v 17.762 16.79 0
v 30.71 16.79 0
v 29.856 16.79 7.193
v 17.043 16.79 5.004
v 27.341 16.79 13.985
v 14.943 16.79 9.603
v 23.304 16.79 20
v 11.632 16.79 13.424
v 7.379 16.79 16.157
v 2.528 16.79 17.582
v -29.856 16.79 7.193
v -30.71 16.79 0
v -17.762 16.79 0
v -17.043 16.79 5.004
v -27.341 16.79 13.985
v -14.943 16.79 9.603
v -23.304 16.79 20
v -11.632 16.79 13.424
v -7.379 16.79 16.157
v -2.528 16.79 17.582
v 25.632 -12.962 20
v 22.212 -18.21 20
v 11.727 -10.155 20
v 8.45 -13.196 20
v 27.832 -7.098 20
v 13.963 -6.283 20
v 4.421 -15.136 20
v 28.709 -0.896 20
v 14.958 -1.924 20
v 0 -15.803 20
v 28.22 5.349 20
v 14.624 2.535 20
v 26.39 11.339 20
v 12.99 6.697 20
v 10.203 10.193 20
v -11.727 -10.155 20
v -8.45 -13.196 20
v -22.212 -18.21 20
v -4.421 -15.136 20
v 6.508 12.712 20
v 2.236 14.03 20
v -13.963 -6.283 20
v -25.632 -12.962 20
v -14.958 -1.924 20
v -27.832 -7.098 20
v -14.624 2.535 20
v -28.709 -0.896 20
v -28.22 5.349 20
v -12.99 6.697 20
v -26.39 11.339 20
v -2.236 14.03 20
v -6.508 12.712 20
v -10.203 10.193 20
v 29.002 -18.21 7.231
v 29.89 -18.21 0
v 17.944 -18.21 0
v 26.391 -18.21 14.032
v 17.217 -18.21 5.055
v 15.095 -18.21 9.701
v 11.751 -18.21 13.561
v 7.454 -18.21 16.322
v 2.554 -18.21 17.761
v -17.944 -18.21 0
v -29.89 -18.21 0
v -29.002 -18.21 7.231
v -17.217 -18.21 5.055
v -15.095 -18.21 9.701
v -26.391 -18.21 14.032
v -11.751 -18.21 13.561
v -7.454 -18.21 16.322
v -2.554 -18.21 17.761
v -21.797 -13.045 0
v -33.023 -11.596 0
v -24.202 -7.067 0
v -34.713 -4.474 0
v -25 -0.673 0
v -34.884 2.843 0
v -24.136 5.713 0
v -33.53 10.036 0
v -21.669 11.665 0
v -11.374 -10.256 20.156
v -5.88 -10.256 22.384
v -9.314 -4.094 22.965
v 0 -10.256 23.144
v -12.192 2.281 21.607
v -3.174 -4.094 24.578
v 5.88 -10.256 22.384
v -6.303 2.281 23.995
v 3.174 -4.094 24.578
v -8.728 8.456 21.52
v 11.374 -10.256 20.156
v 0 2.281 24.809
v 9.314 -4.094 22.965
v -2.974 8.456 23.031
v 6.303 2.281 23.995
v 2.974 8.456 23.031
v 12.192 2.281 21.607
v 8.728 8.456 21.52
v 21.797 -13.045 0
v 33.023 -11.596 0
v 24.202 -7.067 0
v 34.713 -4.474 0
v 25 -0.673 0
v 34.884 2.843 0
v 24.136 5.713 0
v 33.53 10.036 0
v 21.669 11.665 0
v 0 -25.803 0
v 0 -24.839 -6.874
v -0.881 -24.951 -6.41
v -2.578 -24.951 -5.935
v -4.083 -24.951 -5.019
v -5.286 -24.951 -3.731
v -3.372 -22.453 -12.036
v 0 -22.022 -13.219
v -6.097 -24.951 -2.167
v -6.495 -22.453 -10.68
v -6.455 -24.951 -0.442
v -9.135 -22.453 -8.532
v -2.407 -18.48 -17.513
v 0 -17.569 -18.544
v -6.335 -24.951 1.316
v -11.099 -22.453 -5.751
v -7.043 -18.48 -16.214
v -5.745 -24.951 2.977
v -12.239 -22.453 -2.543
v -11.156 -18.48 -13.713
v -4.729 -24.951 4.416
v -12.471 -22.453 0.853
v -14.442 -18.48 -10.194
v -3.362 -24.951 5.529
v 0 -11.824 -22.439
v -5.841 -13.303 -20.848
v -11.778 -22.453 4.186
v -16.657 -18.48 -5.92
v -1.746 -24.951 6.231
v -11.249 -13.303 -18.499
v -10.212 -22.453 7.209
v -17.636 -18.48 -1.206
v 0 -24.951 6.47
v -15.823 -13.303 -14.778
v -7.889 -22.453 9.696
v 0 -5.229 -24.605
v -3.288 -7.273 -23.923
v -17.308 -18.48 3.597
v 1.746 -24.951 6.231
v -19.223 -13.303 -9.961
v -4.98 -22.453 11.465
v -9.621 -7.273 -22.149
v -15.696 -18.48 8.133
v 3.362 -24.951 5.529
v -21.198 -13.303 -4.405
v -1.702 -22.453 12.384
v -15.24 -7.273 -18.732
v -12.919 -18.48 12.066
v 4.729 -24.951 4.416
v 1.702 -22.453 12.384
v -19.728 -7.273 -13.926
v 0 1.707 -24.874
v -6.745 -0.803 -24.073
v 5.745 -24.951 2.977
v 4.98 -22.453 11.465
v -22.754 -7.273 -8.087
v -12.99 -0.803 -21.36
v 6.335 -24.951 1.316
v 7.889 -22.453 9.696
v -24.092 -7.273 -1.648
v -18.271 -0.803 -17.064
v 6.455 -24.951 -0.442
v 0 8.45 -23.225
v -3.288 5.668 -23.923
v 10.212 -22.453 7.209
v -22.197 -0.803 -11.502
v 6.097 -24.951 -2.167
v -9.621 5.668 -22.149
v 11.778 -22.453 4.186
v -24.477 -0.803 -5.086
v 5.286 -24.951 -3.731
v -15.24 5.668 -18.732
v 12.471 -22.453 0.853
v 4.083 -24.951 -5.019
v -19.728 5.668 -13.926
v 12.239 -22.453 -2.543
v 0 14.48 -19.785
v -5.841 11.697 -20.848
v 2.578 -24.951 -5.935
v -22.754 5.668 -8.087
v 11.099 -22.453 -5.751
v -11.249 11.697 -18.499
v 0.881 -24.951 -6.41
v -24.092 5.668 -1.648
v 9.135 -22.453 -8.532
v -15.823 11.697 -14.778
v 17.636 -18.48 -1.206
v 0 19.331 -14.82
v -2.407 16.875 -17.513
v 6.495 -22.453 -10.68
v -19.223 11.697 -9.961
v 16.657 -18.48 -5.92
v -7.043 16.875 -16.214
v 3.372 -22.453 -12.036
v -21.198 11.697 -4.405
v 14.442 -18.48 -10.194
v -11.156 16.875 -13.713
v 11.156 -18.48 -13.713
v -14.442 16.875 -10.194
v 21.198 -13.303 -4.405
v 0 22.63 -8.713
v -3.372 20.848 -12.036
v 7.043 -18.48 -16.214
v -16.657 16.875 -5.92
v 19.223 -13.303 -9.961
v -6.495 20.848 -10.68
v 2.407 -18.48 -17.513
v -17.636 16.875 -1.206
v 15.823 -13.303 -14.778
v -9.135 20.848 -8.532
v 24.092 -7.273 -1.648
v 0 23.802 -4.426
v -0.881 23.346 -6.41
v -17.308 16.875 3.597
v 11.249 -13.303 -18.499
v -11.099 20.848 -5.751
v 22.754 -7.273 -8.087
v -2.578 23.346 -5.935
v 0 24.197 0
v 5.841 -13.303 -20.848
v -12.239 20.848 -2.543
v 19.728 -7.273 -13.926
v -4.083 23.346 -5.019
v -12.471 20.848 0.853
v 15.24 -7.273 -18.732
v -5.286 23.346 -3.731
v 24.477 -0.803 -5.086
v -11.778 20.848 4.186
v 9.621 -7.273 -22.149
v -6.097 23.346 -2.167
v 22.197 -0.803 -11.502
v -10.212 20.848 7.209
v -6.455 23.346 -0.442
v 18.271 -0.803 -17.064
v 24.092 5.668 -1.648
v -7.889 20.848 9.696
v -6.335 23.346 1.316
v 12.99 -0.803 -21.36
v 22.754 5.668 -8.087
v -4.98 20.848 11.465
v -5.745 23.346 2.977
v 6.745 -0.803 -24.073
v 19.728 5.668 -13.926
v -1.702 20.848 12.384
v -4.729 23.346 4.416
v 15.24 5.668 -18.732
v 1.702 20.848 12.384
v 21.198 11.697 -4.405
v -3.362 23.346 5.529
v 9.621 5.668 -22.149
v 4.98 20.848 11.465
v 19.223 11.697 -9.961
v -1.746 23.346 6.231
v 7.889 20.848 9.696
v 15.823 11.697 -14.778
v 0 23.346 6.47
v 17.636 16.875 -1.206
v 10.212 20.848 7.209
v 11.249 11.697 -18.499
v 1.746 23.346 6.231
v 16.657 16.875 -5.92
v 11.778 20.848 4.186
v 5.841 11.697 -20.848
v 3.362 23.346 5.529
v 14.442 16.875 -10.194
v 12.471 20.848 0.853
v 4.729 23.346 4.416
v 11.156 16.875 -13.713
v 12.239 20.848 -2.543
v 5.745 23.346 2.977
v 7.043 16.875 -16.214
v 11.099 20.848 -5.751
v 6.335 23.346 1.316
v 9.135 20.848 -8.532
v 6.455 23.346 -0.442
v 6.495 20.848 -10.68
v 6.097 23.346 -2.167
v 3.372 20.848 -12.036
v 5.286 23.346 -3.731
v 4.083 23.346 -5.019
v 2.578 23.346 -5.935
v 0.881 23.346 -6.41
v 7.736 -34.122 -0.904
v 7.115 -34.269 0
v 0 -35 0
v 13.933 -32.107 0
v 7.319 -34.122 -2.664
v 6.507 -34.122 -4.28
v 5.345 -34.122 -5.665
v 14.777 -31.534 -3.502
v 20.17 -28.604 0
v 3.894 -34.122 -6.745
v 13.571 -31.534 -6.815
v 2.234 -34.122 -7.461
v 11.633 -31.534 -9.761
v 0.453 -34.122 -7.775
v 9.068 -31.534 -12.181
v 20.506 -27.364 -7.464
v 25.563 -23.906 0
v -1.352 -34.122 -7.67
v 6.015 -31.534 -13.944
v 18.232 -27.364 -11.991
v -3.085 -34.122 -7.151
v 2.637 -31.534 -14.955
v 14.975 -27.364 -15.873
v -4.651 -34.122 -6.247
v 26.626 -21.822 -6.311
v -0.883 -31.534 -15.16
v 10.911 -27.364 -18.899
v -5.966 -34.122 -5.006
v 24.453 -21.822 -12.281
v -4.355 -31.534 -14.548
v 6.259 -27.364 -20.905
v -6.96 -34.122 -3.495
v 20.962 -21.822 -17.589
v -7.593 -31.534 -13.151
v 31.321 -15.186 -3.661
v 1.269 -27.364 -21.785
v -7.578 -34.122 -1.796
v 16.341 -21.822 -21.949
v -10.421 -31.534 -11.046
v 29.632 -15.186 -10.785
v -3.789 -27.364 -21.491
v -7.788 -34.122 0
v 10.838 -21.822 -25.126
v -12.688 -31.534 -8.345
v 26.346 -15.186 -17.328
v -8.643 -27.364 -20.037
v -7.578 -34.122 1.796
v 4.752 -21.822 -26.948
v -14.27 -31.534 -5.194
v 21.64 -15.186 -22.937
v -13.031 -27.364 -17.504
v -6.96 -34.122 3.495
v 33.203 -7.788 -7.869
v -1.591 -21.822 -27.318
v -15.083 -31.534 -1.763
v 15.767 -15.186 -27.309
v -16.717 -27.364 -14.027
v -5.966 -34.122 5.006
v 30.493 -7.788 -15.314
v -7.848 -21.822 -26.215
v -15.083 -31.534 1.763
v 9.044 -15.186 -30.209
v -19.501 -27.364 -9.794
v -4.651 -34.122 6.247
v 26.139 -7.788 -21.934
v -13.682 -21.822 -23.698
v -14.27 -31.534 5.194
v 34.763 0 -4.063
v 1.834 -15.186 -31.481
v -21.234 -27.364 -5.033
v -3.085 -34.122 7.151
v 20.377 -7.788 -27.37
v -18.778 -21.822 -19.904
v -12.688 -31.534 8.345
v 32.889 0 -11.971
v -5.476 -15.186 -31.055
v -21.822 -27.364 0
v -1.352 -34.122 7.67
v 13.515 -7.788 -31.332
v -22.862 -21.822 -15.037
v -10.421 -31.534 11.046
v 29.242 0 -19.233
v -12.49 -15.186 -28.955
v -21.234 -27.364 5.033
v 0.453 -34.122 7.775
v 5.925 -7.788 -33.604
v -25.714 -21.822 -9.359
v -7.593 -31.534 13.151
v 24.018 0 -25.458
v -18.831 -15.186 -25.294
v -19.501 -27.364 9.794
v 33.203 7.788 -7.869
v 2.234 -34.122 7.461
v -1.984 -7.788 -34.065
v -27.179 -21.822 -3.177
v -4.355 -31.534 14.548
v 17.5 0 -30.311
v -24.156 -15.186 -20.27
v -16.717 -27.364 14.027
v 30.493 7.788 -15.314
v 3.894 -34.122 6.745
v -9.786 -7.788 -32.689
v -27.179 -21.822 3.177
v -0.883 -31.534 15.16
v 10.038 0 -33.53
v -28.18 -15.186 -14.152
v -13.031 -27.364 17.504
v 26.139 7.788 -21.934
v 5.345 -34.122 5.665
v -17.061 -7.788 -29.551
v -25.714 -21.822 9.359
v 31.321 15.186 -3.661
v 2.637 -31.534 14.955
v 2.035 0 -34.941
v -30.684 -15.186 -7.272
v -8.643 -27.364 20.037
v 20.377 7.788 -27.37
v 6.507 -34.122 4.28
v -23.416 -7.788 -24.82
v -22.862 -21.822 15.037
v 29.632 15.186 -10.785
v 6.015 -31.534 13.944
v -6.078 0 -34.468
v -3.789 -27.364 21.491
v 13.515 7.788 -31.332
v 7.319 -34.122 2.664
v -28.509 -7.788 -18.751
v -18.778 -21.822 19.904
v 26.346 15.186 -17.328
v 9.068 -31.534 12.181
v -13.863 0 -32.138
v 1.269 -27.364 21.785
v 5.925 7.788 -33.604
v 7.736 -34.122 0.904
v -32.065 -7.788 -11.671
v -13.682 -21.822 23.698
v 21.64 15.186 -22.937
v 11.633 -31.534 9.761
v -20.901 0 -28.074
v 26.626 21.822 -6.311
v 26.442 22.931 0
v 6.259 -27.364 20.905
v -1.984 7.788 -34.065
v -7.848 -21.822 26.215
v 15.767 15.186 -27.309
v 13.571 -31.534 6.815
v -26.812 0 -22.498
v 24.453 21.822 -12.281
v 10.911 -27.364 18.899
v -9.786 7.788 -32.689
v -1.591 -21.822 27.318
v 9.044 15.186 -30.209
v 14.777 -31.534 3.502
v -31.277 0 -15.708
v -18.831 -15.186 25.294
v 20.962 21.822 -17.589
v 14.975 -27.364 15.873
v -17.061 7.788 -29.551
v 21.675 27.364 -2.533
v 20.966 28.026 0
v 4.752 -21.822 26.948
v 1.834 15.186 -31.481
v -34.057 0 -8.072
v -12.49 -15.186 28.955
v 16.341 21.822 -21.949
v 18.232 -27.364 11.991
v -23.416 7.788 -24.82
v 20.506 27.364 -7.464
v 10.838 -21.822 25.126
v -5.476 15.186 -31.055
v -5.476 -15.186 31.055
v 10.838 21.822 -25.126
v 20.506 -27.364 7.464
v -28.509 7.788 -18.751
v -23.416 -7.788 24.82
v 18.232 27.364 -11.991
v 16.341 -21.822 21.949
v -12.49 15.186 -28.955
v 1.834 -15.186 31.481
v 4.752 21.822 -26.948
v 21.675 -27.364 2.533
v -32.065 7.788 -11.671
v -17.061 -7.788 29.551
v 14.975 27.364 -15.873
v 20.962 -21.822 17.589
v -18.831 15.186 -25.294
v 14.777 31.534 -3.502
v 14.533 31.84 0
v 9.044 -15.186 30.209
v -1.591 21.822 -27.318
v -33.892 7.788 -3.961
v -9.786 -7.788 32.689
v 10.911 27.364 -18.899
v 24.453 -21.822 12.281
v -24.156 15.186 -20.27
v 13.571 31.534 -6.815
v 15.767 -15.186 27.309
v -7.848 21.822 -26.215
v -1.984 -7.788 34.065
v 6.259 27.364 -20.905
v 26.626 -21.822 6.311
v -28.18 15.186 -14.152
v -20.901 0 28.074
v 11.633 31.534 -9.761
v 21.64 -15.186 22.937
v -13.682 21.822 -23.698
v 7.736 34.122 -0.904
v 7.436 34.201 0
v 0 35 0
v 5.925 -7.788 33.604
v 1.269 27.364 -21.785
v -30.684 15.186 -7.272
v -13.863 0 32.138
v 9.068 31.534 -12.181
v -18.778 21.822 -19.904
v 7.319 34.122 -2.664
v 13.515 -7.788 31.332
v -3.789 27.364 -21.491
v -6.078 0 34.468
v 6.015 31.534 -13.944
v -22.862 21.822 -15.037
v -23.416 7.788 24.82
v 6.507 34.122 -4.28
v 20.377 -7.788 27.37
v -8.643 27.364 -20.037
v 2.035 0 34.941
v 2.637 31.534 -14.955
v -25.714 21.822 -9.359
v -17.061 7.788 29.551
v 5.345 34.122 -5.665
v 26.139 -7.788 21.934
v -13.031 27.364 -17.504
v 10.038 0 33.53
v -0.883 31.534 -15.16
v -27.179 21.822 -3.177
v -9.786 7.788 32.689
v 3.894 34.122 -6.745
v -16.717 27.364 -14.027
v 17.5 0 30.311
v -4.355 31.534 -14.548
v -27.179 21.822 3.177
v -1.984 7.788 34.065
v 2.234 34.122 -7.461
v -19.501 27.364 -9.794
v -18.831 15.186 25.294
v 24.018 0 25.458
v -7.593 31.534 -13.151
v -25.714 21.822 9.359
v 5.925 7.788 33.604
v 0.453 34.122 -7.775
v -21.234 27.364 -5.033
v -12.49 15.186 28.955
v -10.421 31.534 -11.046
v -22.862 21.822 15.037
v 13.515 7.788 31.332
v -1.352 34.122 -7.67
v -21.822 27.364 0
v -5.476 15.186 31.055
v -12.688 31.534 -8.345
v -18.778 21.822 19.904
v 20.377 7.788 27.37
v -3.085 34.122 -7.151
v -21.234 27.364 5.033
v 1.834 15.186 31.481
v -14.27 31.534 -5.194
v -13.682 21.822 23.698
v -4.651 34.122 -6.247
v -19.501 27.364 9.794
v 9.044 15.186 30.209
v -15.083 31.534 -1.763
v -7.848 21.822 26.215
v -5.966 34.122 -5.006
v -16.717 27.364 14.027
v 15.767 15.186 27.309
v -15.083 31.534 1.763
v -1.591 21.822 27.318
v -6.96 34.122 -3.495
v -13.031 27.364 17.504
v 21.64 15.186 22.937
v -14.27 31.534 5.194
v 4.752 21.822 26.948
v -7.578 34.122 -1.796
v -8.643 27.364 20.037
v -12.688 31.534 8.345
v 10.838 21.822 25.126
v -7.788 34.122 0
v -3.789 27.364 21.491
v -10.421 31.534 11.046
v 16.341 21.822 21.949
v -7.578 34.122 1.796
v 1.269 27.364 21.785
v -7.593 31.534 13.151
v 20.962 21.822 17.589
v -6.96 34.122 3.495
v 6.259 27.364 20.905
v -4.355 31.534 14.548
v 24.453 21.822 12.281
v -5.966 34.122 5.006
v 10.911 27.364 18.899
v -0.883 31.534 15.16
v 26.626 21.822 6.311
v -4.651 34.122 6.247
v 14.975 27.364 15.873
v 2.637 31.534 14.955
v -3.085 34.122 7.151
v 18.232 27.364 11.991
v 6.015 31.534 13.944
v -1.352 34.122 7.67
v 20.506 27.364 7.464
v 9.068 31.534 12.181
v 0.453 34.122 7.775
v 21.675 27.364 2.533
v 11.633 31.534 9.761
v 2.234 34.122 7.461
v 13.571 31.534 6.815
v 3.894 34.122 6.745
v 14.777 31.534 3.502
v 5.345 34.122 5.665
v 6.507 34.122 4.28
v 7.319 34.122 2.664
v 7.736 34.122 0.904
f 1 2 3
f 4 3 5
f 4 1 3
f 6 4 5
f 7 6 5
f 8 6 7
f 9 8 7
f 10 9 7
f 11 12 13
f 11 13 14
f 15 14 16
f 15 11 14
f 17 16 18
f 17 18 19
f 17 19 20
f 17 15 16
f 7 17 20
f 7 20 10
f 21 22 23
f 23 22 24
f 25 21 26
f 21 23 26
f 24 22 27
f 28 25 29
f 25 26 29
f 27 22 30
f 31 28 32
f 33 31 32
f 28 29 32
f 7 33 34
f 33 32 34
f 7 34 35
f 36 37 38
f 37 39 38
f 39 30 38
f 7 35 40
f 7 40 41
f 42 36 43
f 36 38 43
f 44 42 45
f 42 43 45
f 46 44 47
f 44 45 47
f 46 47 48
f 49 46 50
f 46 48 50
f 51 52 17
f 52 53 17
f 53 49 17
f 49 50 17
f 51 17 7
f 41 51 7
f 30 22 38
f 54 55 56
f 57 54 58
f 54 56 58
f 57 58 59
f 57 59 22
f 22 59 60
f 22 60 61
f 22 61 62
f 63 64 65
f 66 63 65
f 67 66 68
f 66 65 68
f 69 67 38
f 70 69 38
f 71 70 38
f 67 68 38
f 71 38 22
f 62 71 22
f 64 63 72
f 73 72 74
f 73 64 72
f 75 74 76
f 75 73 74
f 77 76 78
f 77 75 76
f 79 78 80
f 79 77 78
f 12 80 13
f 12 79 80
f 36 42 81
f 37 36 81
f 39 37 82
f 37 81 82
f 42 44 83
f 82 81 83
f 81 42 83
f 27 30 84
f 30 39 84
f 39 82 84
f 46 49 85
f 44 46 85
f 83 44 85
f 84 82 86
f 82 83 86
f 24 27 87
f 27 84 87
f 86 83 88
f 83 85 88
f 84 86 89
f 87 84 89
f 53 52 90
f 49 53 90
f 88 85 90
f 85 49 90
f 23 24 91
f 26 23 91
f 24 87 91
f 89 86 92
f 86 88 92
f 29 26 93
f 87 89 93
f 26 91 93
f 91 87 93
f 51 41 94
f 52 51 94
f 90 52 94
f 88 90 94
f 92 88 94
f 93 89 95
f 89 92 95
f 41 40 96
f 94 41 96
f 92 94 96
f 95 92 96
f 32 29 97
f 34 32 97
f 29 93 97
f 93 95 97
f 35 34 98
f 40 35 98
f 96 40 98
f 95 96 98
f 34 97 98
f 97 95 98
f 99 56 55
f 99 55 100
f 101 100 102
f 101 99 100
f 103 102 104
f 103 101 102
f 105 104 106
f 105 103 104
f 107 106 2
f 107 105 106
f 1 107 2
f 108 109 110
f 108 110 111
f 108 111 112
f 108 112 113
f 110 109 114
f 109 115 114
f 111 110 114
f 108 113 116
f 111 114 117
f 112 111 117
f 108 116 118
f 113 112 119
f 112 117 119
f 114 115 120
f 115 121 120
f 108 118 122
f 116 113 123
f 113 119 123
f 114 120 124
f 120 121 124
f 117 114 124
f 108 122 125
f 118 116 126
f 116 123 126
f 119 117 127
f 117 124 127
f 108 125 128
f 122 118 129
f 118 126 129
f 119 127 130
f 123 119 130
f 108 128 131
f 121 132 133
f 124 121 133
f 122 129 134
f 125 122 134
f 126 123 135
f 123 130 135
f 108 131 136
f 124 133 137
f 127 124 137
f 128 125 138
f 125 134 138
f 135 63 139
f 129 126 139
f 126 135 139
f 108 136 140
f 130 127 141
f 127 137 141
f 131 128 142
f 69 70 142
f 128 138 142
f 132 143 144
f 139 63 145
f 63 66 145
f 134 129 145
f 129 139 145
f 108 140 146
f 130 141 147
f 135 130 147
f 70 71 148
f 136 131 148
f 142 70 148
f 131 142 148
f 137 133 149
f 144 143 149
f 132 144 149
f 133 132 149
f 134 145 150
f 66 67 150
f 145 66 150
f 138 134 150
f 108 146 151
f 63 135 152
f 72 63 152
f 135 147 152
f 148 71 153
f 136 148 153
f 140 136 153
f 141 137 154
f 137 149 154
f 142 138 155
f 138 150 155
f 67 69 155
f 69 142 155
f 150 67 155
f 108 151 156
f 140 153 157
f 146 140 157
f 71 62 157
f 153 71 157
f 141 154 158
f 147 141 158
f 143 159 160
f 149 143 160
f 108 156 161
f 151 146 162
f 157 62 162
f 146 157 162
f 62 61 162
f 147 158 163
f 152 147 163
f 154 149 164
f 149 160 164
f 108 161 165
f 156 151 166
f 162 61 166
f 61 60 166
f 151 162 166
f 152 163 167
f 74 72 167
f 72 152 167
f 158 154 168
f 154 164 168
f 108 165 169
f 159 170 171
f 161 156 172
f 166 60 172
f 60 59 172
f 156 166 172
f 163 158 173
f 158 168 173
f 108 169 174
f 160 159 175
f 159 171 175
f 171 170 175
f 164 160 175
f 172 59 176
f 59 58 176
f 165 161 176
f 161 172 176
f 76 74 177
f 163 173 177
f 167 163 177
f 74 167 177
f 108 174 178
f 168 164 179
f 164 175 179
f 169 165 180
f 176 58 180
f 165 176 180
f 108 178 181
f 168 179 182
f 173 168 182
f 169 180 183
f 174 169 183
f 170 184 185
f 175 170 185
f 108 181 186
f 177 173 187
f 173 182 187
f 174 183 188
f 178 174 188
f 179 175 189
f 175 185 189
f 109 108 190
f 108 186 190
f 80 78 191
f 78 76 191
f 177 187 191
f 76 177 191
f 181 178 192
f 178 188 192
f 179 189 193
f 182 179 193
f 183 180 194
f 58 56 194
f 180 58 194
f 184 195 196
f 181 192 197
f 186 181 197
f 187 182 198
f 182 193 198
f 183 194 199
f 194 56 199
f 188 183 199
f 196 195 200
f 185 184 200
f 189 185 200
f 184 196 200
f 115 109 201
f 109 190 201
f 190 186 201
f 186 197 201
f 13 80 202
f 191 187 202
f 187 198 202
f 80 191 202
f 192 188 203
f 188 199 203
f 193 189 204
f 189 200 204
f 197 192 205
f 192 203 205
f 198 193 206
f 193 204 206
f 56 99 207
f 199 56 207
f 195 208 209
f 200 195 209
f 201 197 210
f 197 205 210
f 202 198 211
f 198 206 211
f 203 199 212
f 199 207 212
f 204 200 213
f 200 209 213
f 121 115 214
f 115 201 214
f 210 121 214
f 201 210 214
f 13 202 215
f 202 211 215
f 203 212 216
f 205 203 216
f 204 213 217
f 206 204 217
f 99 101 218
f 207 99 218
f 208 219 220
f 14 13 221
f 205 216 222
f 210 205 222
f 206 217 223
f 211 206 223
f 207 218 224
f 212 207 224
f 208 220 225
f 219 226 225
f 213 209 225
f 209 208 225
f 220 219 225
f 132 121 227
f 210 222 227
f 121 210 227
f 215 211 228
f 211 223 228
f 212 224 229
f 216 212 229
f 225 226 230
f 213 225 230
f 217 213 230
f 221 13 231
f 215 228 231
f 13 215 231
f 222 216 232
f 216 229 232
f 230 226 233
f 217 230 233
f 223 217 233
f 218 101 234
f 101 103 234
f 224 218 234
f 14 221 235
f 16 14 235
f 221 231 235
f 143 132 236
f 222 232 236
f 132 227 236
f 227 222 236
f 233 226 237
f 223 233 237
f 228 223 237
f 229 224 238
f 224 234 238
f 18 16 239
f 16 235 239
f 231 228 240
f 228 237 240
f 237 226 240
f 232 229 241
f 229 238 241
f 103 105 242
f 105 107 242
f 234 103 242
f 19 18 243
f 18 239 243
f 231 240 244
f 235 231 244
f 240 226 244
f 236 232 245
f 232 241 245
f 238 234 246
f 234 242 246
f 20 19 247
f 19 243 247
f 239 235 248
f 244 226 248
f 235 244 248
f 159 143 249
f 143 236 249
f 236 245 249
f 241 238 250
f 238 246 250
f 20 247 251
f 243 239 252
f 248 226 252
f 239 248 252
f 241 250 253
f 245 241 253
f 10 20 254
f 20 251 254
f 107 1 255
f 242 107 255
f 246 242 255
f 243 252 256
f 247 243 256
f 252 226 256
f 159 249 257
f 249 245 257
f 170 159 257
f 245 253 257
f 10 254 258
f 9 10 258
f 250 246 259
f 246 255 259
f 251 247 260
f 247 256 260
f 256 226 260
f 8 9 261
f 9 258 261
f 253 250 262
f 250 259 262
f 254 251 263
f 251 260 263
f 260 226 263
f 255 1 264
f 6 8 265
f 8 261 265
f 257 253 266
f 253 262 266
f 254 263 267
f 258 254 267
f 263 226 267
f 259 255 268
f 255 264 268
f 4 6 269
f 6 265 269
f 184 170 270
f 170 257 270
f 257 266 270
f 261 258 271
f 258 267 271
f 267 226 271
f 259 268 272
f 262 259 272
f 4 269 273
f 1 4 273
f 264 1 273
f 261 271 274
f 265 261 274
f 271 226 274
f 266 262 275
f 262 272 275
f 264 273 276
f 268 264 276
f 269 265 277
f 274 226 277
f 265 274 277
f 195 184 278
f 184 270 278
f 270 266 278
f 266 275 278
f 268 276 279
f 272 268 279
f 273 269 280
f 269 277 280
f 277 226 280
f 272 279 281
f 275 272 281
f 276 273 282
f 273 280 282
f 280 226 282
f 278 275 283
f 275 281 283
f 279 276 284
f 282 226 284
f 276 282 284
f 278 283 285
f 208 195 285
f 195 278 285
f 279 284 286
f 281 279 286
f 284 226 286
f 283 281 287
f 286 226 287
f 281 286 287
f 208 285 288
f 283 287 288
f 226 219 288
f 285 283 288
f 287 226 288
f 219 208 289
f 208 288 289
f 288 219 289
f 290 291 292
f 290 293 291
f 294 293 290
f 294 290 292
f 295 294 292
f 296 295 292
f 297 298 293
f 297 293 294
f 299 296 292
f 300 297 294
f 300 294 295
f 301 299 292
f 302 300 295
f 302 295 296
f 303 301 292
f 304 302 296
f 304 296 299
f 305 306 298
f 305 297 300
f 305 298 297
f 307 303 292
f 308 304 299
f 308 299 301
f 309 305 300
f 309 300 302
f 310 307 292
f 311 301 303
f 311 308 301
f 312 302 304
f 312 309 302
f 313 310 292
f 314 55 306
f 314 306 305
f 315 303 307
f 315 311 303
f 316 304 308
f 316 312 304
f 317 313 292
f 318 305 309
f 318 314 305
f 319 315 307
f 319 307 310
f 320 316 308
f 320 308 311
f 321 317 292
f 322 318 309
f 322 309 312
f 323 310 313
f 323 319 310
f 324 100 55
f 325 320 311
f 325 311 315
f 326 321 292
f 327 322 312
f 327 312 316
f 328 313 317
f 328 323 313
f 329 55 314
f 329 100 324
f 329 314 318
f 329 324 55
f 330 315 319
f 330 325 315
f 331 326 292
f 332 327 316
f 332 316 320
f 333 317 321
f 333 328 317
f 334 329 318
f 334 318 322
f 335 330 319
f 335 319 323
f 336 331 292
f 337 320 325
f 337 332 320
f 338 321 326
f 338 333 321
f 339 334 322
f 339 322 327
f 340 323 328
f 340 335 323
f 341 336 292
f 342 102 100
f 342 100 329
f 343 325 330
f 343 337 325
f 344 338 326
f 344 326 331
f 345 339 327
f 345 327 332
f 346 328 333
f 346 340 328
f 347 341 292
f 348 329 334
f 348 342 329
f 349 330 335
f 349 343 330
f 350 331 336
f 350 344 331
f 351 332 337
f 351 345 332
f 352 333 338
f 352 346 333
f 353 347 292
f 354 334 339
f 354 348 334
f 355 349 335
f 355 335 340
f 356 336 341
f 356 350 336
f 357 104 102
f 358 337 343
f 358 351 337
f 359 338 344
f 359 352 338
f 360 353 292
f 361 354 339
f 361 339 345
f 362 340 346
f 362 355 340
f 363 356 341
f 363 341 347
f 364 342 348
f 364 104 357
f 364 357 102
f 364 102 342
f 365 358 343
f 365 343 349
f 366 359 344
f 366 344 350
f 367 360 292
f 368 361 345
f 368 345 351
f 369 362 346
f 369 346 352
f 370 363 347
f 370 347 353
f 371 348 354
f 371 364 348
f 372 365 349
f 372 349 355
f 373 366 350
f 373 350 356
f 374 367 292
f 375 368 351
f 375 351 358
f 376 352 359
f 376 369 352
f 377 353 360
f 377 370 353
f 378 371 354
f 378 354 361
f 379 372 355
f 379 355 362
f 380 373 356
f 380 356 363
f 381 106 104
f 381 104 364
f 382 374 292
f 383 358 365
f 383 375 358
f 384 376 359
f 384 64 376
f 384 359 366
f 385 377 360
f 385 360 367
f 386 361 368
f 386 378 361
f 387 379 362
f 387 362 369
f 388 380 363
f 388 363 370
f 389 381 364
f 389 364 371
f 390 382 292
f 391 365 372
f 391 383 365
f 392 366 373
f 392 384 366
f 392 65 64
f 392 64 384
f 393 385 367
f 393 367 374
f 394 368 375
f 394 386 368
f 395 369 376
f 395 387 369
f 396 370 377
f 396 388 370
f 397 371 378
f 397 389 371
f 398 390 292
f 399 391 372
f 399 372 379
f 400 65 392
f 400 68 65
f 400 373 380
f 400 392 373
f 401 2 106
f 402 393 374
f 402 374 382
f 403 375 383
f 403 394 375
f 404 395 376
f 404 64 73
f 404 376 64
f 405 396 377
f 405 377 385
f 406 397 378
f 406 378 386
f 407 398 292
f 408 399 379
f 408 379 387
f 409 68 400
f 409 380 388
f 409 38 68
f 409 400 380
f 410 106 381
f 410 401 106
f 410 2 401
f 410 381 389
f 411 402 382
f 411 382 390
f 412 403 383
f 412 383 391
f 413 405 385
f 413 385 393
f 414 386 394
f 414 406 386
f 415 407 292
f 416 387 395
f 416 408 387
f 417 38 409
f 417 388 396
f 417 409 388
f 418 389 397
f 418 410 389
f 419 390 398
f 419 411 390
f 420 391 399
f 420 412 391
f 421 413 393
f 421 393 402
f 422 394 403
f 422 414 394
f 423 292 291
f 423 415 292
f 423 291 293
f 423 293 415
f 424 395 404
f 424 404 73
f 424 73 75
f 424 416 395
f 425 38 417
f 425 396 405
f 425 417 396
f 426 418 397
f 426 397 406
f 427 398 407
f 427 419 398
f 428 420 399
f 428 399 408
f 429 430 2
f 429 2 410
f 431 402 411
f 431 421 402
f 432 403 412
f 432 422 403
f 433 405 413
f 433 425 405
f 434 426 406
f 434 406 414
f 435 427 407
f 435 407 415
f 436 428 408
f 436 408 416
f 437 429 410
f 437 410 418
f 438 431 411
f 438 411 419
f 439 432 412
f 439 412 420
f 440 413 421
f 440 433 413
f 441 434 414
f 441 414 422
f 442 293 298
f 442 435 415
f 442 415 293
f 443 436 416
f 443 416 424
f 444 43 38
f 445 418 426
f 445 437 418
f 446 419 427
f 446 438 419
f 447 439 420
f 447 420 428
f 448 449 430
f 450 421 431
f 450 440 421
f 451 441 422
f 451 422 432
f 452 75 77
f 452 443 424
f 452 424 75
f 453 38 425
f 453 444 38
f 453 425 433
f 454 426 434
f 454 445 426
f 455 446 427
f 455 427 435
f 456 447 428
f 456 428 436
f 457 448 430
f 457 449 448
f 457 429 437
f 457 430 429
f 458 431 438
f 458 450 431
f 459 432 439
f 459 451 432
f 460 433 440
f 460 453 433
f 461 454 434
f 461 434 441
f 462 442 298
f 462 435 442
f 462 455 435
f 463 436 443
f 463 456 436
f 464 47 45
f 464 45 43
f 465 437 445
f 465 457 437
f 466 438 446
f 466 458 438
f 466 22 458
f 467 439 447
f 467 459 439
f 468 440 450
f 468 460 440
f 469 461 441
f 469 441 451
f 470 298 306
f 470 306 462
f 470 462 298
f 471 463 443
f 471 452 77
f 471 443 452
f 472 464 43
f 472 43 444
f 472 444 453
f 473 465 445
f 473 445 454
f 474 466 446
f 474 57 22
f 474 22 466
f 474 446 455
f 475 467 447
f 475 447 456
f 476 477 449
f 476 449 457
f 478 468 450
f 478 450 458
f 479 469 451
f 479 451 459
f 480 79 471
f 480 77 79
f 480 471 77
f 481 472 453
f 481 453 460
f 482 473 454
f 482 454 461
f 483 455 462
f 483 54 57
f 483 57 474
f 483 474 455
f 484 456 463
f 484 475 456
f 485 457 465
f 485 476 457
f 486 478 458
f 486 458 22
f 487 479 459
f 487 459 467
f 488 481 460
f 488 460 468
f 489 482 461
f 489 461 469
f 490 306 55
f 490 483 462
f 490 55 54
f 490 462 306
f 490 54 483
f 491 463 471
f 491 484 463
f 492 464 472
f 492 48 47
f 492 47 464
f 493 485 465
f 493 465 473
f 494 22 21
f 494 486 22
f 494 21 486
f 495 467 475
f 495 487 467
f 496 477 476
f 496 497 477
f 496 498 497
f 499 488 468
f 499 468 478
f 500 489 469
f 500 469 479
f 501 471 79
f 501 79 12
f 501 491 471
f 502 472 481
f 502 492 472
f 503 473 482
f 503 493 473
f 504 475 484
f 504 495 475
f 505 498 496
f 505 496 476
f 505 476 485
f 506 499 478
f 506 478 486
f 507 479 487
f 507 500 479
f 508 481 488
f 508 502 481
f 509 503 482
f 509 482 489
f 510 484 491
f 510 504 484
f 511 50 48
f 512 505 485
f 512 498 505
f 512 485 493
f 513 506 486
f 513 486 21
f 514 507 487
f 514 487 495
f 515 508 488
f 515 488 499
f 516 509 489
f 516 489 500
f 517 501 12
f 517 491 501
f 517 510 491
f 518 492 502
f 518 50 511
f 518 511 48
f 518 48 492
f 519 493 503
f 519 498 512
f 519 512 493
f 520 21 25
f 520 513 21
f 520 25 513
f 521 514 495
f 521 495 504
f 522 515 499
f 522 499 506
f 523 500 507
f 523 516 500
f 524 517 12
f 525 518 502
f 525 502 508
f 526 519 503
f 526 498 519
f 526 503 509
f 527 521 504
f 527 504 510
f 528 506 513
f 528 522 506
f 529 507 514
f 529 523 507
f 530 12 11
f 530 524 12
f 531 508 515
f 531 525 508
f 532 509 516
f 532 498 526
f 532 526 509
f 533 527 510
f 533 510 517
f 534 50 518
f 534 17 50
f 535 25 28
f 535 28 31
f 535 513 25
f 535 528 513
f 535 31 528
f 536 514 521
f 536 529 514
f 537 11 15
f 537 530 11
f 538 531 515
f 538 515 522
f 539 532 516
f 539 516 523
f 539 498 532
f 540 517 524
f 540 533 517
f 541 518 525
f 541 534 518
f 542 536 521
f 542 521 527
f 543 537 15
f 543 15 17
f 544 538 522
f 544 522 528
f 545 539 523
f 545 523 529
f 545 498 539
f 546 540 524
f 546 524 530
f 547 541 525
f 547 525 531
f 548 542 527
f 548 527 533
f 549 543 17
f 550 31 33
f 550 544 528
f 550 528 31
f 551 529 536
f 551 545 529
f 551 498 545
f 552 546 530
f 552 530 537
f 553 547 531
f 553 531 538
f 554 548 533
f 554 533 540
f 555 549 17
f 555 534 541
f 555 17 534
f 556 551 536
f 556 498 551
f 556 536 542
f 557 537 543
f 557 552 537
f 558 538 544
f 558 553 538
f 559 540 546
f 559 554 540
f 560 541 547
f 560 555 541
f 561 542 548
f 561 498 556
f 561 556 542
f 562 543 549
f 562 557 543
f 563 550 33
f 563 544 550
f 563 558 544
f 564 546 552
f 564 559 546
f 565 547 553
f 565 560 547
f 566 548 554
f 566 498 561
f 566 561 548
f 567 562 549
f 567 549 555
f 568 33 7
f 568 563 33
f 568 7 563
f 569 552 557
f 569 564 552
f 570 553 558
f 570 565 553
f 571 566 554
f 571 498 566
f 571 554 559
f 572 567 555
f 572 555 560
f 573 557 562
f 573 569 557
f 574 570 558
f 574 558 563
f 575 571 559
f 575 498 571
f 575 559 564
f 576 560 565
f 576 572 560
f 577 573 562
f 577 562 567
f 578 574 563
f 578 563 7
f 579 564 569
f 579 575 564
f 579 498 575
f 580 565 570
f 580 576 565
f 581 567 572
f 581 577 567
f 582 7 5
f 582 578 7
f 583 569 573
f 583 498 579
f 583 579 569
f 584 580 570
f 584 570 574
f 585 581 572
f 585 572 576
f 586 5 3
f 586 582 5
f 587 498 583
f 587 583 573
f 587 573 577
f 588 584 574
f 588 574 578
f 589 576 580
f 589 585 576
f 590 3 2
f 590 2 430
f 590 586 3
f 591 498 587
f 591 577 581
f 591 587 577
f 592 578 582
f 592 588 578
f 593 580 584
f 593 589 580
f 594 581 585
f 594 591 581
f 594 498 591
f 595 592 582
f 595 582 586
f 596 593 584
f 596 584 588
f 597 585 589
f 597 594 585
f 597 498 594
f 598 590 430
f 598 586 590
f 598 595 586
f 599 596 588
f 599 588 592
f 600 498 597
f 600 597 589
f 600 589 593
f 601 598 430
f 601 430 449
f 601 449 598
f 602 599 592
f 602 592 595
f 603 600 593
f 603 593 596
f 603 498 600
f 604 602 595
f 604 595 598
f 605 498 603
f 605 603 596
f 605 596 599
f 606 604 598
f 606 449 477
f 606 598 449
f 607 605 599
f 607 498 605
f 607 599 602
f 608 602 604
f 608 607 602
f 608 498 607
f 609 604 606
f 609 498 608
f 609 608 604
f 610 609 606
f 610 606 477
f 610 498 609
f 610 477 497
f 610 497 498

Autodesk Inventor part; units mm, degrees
ref_plane "YZ Plane" through (0, 0, 0) normal (1, 0, 0) x (0, 1, 0)
ref_plane "XZ Plane" through (0, 0, 0) normal (0, 1, 0) x (-1, 0, 0)
ref_plane "XY Plane" through (0, 0, 0) normal (0, 0, 1) x (1, 0, 0)
sketch "Эскиз1" plane through (0, 0, 0) normal (0, 0, 1) x (1, 0, 0)
  circle A0 centre (0, 0) radius 35
  line L0 (0, 35) -> (0, -35)
  dimension "d0" = 70
revolve "Вращение1" add sketch "Эскиз1" angle 360 about axis through (0, 35, 0) along (0, -1, 0)
sketch "Эскиз2" plane through (0, 0, 0) normal (1, 0, 0) x (0, 1, 0)
  circle A0 centre (-0.8026, 0) radius 25
  line L0 (24.1974, 0) -> (-25.8026, 0)
  point P0 (0, 0)
  dimension "d2" = 50
revolve "Вращение2" cut sketch "Эскиз2" angle 360 about axis through (0, 24.1974, 0) along (0, -1, 0) picked at (-3.9998, -9.7861) contours A0 L0
sketch "Эскиз3" plane through (0, 0, 0) normal (1, 0, 0) x (0, 1, 0)
  circle A0 centre (-0.8026, 0) radius 25 projected
  line L0 (16.7899, 17.7624) -> (-18.4199, 17.7624)
  line L1 (-18.4199, 17.7624) -> (-18.4199, 0)
  line L2 (-18.4199, 0) -> (16.7899, 0)
  line L3 (16.7899, 0) -> (16.7899, 17.7624)
  line L4 (16.7899, 0) -> (-18.2101, 0)
  line L5 (-18.2101, 0) -> (-18.2101, 20)
  line L6 (-18.2101, 20) -> (16.7899, 20)
  line L7 (16.7899, 20) -> (16.7899, 0)
  point P0 (0, 0)
  dimension "d4" = 35
  dimension "d5" = 20
extrude "Выдавливание1" cut sketch "Эскиз3" along normal mid plane 100 contours L0 L5 A0 L6 | L3 L2 L5 L0 | A0 L6 L7 | A0 L5 L6
properties part number "Шар"
